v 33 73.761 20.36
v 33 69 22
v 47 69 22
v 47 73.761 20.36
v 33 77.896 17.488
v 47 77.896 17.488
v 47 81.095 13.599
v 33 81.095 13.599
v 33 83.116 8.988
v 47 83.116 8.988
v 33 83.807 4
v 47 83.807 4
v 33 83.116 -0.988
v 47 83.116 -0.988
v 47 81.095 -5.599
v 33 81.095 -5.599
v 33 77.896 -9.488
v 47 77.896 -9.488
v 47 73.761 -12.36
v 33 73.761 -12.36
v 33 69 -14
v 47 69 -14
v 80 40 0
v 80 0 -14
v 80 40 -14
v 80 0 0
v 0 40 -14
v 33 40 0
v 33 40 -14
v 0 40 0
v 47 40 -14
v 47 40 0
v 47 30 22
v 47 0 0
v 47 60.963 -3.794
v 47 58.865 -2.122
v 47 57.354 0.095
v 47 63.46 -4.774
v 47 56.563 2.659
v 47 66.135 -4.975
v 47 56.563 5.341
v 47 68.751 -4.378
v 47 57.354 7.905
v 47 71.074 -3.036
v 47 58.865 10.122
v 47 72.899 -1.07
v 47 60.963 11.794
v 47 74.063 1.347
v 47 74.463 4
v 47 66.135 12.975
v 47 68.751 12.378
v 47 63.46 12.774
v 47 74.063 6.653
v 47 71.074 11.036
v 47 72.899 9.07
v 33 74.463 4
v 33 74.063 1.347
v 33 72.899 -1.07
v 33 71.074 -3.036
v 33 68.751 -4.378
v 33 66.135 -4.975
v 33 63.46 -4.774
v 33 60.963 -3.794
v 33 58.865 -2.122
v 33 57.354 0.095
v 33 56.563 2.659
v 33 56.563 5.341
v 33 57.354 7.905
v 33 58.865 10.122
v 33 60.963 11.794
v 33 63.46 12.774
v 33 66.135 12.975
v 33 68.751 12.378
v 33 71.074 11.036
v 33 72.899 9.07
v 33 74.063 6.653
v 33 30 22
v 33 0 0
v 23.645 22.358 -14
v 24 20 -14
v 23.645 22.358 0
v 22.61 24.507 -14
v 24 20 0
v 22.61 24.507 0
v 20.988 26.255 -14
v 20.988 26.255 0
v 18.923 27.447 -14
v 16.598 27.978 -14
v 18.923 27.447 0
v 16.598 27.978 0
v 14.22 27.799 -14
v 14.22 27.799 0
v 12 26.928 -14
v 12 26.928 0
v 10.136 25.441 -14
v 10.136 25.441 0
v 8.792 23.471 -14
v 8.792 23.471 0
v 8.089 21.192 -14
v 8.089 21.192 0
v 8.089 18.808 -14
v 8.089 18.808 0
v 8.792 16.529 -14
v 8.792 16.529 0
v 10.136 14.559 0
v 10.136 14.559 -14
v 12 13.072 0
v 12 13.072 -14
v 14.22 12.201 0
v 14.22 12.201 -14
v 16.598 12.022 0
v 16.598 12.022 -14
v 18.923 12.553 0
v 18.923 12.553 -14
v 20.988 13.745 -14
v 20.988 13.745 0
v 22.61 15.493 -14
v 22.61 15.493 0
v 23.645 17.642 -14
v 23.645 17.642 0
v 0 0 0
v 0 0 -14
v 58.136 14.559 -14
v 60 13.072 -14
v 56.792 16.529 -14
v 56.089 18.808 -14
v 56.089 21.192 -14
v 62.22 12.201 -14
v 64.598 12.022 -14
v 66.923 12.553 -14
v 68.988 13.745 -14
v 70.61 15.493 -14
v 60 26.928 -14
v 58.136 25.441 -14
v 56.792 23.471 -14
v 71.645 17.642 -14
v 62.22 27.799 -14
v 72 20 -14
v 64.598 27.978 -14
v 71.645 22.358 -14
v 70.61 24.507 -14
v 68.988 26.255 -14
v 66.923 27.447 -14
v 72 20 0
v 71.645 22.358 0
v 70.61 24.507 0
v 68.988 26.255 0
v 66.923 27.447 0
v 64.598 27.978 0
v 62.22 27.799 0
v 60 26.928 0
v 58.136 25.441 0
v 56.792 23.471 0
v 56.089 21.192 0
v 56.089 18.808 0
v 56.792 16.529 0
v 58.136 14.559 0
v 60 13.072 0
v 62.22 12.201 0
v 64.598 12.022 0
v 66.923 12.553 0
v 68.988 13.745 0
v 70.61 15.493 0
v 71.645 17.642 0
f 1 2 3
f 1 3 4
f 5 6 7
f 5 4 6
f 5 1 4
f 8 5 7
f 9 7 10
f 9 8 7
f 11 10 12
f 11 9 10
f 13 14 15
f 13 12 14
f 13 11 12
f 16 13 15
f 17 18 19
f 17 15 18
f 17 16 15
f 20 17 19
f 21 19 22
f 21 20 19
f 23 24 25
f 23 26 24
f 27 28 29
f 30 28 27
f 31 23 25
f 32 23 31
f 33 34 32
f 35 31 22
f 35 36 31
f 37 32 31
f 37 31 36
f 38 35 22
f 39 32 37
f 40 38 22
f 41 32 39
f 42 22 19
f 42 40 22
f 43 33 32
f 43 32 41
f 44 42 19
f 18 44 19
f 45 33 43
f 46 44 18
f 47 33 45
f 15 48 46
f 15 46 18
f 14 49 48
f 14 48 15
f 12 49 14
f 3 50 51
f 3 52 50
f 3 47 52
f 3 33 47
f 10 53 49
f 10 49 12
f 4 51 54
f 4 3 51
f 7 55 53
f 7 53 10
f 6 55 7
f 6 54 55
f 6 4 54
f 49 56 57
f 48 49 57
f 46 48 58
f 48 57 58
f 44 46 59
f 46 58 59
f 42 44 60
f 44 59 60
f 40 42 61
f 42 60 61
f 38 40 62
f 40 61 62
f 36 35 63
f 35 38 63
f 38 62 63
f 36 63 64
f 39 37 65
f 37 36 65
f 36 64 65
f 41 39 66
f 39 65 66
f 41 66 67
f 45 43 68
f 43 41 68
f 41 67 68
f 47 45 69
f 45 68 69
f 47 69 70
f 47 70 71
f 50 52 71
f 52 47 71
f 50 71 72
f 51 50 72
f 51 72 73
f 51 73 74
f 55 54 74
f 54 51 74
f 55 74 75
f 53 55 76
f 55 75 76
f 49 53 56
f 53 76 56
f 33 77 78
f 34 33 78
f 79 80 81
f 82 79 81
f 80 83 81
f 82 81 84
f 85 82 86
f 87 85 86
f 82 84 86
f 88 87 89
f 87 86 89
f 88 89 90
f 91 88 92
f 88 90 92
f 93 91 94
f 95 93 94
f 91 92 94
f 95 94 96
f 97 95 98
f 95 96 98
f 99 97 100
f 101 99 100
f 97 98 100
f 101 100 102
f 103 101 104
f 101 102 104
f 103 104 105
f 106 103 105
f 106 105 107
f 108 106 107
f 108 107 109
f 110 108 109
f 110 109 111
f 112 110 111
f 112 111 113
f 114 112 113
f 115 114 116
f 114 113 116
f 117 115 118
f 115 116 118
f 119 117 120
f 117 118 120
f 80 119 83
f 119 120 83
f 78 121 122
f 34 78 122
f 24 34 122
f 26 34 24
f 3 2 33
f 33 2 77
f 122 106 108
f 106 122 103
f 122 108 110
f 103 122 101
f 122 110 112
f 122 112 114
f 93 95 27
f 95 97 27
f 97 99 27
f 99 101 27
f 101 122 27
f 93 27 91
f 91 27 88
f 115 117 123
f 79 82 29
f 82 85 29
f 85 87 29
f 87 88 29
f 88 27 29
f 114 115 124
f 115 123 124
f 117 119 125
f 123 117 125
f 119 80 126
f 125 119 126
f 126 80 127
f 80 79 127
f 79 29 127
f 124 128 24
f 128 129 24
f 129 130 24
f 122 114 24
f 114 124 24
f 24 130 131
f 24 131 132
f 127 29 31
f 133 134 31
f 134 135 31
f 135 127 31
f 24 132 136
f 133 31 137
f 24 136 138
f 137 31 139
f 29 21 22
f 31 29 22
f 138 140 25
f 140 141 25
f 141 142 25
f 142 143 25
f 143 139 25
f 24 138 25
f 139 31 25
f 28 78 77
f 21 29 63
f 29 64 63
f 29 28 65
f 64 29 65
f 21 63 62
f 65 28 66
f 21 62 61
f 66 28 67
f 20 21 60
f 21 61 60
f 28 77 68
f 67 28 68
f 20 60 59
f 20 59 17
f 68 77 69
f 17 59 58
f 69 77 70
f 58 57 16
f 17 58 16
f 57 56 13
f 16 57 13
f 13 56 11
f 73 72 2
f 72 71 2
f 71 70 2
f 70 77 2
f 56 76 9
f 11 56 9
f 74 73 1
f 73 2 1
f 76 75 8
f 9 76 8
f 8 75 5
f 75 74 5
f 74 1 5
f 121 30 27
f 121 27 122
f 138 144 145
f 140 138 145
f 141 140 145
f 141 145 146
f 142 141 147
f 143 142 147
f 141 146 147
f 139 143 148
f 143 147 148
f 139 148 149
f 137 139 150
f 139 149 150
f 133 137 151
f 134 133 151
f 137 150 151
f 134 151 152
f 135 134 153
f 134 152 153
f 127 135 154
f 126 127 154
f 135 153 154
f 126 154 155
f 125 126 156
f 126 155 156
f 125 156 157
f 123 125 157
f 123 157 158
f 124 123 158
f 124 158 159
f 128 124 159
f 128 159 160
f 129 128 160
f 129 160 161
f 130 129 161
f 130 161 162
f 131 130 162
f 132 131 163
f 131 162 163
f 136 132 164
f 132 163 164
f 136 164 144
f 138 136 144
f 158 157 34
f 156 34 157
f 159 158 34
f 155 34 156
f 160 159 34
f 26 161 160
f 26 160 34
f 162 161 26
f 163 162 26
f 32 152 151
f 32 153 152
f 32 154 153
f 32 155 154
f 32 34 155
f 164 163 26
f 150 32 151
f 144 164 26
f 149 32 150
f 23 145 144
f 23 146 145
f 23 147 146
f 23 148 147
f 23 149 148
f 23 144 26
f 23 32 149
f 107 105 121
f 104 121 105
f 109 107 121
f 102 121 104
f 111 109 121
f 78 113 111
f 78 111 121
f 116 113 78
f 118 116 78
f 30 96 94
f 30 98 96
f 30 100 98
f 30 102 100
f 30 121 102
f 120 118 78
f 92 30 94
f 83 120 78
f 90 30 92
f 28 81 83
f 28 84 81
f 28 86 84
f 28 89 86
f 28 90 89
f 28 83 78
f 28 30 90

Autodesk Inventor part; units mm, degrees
ref_plane "XZ Plane" through (0, 0, 0) normal (0, 1, 0) x (-1, 0, 0)
ref_plane "XY Plane" through (0, 0, 0) normal (0, 0, 1) x (1, 0, 0)
sketch "Náčrt1" plane through (0, 0, 0) normal (0, 0, 1) x (1, 0, 0)
  line L0 (0, 0) -> (80, 0)
  line L1 (80, 0) -> (80, 40)
  line L2 (80, 40) -> (0, 40)
  line L3 (0, 40) -> (0, 0)
  circle A0 centre (16, 20) radius 8
  circle A1 centre (64, 20) radius 8
  dimension "d0" = 80
  dimension "d1" = 40
  dimension "d2" = 16
  dimension "d3" = 16
extrude "Vysunutí1" add sketch "Náčrt1" against normal blind 14
ref_plane "Pracovní rovina1" through (40, 0, 0) normal (1, 0, 0) x (0, 1, 0)
sketch "Náčrt2" plane through (40, 0, 0) normal (1, 0, 0) x (0, 1, 0)
  line L0 (0, -14) -> (40, -14) projected
  line L1 (40, -14) -> (69, -14)
  line L2 (40, 0) -> (0, 0) projected
  circle A0 centre (65.4628, 4) radius 9
  arc A1 (69, -14) -> (69, 22) centre (65.4628, 4) ccw
  line L3 (69, 22) -> (30, 22)
  line L4 (30, 22) -> (0, 0)
  line L5 (0, 0) -> (0, -14)
  line L6 (0, -14) -> (40, -14)
  dimension "d7" = 29
  dimension "d9" = 18
  dimension "d10" = 36
  dimension "d11" = 18.3443
  dimension "d12" = 39
extrude "Vysunutí2" add sketch "Náčrt2" along normal mid plane 14
properties part number "14"
